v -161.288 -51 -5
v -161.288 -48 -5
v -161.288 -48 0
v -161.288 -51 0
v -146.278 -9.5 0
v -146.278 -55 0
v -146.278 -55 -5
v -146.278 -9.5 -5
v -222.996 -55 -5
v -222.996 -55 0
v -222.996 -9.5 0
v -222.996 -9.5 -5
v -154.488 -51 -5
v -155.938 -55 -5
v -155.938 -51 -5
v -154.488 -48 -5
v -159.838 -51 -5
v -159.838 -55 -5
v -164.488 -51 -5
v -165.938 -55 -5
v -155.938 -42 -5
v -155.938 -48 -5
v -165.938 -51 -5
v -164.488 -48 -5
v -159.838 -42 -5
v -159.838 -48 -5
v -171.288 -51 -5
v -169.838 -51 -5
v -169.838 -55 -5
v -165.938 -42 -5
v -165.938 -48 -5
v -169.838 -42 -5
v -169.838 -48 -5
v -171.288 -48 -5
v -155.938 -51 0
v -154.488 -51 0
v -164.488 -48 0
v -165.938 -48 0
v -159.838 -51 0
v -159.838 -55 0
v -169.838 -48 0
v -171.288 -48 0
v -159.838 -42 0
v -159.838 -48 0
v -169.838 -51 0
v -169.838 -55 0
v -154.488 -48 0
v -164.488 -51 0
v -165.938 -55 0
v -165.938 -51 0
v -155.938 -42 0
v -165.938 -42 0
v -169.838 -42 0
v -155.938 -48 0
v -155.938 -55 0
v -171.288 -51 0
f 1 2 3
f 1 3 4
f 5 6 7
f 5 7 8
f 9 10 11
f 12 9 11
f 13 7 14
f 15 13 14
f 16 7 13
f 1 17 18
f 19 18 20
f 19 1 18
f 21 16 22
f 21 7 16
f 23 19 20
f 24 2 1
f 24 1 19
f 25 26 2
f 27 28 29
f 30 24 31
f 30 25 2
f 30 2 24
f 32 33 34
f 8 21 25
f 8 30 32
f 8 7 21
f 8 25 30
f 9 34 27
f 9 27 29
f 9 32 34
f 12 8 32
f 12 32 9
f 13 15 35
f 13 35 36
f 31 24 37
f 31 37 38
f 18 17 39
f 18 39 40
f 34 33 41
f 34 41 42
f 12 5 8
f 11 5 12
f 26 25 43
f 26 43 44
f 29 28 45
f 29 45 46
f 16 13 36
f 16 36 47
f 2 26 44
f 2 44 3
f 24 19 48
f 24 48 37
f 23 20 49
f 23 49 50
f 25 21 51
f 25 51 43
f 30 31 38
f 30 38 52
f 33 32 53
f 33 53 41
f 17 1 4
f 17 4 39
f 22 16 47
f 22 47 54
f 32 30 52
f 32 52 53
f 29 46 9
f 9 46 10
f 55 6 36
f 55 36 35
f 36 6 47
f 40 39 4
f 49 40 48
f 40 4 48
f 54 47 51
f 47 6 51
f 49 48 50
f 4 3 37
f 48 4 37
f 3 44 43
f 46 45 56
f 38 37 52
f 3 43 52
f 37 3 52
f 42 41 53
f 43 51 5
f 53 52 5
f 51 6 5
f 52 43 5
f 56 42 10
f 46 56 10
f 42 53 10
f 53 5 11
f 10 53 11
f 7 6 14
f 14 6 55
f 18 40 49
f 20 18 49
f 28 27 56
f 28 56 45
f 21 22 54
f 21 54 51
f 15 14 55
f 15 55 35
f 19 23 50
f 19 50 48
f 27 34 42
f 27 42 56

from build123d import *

# Parameters (mm, degrees)
SKETCH2_W           = 76.718161642
SKETCH2_H           = 45.5
BOSS_EXTRUDE1_DEPTH = 5
CUT_EXTRUDE1_DEPTH  = 10


with BuildPart() as part:
    # Sketch2 → Boss-Extrude1 (new body)
    with BuildSketch(Plane(origin=(0, 0, 0), x_dir=(-1, 0, 0), z_dir=(0, 0, -1))):
        with Locations((184.636580821, -32.25)):
            Rectangle(SKETCH2_W, SKETCH2_H)
    extrude(amount=BOSS_EXTRUDE1_DEPTH)

    # Sketch3 → Cut-Extrude1 (cut)
    with BuildSketch(Plane(origin=(0, 0, -5), x_dir=(-1, 0, 0), z_dir=(0, 0, -1))):
        Polygon((155.9375, -55), (155.9375, -51), (154.4875, -51), (154.4875, -48), (155.9375, -48), (155.9375, -42), (159.8375, -42), (159.8375, -48), (161.2875, -48), (161.2875, -51), (159.8375, -51), (159.8375, -55), align=None)
        Polygon((165.9375, -55), (165.9375, -51), (164.4875, -51), (164.4875, -48), (165.9375, -48), (165.9375, -42), (169.8375, -42), (169.8375, -48), (171.2875, -48), (171.2875, -51), (169.8375, -51), (169.8375, -55), align=None)
    extrude(amount=-CUT_EXTRUDE1_DEPTH, mode=Mode.SUBTRACT)


solid = part.part
